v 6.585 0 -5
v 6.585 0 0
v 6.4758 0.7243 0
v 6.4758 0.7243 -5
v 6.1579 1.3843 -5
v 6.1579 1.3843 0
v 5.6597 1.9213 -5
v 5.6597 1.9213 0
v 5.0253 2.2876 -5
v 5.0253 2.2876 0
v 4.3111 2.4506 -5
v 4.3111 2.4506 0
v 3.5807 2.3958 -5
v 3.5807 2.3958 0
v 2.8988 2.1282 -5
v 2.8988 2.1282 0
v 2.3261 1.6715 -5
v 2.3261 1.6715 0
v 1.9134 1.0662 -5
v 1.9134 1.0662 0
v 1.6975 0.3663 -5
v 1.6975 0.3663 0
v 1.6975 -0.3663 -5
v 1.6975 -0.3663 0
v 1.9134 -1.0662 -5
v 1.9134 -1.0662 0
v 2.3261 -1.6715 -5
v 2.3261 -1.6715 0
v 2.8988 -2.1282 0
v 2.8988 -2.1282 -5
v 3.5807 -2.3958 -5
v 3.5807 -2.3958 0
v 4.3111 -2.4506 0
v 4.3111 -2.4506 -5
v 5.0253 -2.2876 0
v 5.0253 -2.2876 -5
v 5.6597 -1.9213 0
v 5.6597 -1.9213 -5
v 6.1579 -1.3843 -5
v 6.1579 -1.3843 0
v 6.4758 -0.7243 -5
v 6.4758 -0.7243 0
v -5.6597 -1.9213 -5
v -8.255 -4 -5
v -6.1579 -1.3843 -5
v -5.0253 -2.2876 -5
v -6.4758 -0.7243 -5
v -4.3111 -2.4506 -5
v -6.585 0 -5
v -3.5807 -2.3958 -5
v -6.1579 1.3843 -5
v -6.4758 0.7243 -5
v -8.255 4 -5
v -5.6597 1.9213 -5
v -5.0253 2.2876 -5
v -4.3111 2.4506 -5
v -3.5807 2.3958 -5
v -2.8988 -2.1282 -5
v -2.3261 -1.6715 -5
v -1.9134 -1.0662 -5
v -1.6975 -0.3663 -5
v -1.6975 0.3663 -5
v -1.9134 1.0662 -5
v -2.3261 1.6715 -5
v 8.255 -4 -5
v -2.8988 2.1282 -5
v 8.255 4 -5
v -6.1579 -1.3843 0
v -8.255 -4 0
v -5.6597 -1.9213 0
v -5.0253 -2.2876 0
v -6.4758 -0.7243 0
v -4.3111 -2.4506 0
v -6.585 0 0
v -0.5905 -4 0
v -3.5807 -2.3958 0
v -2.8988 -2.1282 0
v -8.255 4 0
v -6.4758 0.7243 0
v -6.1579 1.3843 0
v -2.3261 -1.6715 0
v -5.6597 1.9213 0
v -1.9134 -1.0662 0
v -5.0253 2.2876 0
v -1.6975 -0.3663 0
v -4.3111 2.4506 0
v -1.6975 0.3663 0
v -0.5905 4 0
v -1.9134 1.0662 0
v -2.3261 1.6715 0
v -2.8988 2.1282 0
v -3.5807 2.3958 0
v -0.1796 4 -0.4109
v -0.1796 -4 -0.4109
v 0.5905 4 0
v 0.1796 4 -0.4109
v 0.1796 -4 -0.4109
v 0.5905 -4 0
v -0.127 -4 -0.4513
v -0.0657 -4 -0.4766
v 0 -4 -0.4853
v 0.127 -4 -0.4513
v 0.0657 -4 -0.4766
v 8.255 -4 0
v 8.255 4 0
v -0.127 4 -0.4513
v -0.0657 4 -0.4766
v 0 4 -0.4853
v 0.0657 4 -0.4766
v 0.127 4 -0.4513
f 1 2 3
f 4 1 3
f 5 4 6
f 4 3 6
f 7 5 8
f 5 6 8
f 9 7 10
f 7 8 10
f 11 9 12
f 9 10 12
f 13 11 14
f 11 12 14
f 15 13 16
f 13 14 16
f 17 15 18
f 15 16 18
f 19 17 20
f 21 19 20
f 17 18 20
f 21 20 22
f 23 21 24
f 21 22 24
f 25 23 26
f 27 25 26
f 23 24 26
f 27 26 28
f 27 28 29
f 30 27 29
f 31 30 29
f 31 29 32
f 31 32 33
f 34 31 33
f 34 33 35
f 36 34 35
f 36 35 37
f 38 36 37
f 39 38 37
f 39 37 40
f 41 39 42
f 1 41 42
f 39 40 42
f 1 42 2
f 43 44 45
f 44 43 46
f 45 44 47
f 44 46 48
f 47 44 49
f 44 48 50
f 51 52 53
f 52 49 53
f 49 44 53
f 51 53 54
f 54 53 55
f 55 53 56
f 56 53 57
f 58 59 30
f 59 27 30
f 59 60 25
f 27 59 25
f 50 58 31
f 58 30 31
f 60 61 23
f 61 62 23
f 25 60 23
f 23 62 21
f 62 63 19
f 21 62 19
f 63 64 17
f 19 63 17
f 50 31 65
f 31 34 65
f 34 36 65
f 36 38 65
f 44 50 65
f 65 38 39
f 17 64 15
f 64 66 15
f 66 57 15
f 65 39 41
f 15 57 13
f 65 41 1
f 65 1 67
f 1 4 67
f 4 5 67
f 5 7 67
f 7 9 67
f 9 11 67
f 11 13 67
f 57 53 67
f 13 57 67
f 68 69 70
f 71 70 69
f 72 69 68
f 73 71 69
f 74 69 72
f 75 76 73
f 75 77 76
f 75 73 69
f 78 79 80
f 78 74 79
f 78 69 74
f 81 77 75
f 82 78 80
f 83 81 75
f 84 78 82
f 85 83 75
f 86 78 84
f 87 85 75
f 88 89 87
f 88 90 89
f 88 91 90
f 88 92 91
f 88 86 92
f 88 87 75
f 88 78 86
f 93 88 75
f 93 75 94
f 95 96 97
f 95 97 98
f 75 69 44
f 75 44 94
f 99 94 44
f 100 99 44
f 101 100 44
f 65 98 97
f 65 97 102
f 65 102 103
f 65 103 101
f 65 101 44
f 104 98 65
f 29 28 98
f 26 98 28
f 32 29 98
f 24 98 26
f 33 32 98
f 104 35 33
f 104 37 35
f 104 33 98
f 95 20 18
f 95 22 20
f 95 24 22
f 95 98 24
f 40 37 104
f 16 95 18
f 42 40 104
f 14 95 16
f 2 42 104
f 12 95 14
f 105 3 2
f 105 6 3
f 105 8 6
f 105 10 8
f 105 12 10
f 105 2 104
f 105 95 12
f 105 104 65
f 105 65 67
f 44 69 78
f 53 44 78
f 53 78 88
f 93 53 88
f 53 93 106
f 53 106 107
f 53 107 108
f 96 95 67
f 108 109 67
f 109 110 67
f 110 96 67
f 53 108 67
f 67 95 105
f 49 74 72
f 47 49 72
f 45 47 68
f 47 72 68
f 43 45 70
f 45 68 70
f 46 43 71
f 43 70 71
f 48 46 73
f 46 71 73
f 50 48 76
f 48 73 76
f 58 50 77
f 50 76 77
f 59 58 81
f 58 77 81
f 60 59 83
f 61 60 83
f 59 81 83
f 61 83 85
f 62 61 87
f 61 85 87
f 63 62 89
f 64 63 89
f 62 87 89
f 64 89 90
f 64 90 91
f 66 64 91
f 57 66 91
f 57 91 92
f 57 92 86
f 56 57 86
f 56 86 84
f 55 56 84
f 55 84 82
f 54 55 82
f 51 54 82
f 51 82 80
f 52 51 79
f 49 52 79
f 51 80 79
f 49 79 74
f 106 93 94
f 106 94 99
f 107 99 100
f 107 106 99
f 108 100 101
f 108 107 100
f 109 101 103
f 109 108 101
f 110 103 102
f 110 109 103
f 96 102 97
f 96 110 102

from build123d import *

# Parameters (mm, degrees)
SKETCH2_W               = 16.51
SKETCH2_H               = 8
SKETCH2_R               = 2.45745
BASE_EXTRUDE_DEPTH      = 5
CUT_EXTRUDE2_DEPTH      = 5
CUT_EXTRUDE2_DEPTH_BACK = 5


with BuildPart() as part:
    # Sketch2 → Base-Extrude (new body)
    with BuildSketch(Plane.XY):
        Rectangle(SKETCH2_W, SKETCH2_H)
        with Locations((4.1275, 0)):
            Circle(SKETCH2_R, mode=Mode.SUBTRACT)
        with Locations(Location((-4.1275, 0, 0), (0, 0, 180))):  # turned: the seam where the file's is
            Circle(SKETCH2_R, mode=Mode.SUBTRACT)
    extrude(amount=-BASE_EXTRUDE_DEPTH)

    # Sketch3 → Cut-Extrude2 (cut, two sides)
    with BuildSketch(Plane(origin=(0, 0, 0), x_dir=(-1, 0, 0), z_dir=(0, 1, 0))) as cut_extrude2_sk:
        with BuildLine():
            Line((0.590493938, 0), (0.179605122, -0.410888816))
            ThreePointArc((0.179605122, -0.410888816), (0, -0.485283694), (-0.179605122, -0.410888816))
            Line((-0.179605122, -0.410888816), (-0.590493938, 0))
            Line((-0.590493938, 0), (0.590493938, 0))
        make_face()
    extrude(amount=CUT_EXTRUDE2_DEPTH, mode=Mode.SUBTRACT)
    extrude(cut_extrude2_sk.sketch, amount=-CUT_EXTRUDE2_DEPTH_BACK, mode=Mode.SUBTRACT)


solid = part.part
